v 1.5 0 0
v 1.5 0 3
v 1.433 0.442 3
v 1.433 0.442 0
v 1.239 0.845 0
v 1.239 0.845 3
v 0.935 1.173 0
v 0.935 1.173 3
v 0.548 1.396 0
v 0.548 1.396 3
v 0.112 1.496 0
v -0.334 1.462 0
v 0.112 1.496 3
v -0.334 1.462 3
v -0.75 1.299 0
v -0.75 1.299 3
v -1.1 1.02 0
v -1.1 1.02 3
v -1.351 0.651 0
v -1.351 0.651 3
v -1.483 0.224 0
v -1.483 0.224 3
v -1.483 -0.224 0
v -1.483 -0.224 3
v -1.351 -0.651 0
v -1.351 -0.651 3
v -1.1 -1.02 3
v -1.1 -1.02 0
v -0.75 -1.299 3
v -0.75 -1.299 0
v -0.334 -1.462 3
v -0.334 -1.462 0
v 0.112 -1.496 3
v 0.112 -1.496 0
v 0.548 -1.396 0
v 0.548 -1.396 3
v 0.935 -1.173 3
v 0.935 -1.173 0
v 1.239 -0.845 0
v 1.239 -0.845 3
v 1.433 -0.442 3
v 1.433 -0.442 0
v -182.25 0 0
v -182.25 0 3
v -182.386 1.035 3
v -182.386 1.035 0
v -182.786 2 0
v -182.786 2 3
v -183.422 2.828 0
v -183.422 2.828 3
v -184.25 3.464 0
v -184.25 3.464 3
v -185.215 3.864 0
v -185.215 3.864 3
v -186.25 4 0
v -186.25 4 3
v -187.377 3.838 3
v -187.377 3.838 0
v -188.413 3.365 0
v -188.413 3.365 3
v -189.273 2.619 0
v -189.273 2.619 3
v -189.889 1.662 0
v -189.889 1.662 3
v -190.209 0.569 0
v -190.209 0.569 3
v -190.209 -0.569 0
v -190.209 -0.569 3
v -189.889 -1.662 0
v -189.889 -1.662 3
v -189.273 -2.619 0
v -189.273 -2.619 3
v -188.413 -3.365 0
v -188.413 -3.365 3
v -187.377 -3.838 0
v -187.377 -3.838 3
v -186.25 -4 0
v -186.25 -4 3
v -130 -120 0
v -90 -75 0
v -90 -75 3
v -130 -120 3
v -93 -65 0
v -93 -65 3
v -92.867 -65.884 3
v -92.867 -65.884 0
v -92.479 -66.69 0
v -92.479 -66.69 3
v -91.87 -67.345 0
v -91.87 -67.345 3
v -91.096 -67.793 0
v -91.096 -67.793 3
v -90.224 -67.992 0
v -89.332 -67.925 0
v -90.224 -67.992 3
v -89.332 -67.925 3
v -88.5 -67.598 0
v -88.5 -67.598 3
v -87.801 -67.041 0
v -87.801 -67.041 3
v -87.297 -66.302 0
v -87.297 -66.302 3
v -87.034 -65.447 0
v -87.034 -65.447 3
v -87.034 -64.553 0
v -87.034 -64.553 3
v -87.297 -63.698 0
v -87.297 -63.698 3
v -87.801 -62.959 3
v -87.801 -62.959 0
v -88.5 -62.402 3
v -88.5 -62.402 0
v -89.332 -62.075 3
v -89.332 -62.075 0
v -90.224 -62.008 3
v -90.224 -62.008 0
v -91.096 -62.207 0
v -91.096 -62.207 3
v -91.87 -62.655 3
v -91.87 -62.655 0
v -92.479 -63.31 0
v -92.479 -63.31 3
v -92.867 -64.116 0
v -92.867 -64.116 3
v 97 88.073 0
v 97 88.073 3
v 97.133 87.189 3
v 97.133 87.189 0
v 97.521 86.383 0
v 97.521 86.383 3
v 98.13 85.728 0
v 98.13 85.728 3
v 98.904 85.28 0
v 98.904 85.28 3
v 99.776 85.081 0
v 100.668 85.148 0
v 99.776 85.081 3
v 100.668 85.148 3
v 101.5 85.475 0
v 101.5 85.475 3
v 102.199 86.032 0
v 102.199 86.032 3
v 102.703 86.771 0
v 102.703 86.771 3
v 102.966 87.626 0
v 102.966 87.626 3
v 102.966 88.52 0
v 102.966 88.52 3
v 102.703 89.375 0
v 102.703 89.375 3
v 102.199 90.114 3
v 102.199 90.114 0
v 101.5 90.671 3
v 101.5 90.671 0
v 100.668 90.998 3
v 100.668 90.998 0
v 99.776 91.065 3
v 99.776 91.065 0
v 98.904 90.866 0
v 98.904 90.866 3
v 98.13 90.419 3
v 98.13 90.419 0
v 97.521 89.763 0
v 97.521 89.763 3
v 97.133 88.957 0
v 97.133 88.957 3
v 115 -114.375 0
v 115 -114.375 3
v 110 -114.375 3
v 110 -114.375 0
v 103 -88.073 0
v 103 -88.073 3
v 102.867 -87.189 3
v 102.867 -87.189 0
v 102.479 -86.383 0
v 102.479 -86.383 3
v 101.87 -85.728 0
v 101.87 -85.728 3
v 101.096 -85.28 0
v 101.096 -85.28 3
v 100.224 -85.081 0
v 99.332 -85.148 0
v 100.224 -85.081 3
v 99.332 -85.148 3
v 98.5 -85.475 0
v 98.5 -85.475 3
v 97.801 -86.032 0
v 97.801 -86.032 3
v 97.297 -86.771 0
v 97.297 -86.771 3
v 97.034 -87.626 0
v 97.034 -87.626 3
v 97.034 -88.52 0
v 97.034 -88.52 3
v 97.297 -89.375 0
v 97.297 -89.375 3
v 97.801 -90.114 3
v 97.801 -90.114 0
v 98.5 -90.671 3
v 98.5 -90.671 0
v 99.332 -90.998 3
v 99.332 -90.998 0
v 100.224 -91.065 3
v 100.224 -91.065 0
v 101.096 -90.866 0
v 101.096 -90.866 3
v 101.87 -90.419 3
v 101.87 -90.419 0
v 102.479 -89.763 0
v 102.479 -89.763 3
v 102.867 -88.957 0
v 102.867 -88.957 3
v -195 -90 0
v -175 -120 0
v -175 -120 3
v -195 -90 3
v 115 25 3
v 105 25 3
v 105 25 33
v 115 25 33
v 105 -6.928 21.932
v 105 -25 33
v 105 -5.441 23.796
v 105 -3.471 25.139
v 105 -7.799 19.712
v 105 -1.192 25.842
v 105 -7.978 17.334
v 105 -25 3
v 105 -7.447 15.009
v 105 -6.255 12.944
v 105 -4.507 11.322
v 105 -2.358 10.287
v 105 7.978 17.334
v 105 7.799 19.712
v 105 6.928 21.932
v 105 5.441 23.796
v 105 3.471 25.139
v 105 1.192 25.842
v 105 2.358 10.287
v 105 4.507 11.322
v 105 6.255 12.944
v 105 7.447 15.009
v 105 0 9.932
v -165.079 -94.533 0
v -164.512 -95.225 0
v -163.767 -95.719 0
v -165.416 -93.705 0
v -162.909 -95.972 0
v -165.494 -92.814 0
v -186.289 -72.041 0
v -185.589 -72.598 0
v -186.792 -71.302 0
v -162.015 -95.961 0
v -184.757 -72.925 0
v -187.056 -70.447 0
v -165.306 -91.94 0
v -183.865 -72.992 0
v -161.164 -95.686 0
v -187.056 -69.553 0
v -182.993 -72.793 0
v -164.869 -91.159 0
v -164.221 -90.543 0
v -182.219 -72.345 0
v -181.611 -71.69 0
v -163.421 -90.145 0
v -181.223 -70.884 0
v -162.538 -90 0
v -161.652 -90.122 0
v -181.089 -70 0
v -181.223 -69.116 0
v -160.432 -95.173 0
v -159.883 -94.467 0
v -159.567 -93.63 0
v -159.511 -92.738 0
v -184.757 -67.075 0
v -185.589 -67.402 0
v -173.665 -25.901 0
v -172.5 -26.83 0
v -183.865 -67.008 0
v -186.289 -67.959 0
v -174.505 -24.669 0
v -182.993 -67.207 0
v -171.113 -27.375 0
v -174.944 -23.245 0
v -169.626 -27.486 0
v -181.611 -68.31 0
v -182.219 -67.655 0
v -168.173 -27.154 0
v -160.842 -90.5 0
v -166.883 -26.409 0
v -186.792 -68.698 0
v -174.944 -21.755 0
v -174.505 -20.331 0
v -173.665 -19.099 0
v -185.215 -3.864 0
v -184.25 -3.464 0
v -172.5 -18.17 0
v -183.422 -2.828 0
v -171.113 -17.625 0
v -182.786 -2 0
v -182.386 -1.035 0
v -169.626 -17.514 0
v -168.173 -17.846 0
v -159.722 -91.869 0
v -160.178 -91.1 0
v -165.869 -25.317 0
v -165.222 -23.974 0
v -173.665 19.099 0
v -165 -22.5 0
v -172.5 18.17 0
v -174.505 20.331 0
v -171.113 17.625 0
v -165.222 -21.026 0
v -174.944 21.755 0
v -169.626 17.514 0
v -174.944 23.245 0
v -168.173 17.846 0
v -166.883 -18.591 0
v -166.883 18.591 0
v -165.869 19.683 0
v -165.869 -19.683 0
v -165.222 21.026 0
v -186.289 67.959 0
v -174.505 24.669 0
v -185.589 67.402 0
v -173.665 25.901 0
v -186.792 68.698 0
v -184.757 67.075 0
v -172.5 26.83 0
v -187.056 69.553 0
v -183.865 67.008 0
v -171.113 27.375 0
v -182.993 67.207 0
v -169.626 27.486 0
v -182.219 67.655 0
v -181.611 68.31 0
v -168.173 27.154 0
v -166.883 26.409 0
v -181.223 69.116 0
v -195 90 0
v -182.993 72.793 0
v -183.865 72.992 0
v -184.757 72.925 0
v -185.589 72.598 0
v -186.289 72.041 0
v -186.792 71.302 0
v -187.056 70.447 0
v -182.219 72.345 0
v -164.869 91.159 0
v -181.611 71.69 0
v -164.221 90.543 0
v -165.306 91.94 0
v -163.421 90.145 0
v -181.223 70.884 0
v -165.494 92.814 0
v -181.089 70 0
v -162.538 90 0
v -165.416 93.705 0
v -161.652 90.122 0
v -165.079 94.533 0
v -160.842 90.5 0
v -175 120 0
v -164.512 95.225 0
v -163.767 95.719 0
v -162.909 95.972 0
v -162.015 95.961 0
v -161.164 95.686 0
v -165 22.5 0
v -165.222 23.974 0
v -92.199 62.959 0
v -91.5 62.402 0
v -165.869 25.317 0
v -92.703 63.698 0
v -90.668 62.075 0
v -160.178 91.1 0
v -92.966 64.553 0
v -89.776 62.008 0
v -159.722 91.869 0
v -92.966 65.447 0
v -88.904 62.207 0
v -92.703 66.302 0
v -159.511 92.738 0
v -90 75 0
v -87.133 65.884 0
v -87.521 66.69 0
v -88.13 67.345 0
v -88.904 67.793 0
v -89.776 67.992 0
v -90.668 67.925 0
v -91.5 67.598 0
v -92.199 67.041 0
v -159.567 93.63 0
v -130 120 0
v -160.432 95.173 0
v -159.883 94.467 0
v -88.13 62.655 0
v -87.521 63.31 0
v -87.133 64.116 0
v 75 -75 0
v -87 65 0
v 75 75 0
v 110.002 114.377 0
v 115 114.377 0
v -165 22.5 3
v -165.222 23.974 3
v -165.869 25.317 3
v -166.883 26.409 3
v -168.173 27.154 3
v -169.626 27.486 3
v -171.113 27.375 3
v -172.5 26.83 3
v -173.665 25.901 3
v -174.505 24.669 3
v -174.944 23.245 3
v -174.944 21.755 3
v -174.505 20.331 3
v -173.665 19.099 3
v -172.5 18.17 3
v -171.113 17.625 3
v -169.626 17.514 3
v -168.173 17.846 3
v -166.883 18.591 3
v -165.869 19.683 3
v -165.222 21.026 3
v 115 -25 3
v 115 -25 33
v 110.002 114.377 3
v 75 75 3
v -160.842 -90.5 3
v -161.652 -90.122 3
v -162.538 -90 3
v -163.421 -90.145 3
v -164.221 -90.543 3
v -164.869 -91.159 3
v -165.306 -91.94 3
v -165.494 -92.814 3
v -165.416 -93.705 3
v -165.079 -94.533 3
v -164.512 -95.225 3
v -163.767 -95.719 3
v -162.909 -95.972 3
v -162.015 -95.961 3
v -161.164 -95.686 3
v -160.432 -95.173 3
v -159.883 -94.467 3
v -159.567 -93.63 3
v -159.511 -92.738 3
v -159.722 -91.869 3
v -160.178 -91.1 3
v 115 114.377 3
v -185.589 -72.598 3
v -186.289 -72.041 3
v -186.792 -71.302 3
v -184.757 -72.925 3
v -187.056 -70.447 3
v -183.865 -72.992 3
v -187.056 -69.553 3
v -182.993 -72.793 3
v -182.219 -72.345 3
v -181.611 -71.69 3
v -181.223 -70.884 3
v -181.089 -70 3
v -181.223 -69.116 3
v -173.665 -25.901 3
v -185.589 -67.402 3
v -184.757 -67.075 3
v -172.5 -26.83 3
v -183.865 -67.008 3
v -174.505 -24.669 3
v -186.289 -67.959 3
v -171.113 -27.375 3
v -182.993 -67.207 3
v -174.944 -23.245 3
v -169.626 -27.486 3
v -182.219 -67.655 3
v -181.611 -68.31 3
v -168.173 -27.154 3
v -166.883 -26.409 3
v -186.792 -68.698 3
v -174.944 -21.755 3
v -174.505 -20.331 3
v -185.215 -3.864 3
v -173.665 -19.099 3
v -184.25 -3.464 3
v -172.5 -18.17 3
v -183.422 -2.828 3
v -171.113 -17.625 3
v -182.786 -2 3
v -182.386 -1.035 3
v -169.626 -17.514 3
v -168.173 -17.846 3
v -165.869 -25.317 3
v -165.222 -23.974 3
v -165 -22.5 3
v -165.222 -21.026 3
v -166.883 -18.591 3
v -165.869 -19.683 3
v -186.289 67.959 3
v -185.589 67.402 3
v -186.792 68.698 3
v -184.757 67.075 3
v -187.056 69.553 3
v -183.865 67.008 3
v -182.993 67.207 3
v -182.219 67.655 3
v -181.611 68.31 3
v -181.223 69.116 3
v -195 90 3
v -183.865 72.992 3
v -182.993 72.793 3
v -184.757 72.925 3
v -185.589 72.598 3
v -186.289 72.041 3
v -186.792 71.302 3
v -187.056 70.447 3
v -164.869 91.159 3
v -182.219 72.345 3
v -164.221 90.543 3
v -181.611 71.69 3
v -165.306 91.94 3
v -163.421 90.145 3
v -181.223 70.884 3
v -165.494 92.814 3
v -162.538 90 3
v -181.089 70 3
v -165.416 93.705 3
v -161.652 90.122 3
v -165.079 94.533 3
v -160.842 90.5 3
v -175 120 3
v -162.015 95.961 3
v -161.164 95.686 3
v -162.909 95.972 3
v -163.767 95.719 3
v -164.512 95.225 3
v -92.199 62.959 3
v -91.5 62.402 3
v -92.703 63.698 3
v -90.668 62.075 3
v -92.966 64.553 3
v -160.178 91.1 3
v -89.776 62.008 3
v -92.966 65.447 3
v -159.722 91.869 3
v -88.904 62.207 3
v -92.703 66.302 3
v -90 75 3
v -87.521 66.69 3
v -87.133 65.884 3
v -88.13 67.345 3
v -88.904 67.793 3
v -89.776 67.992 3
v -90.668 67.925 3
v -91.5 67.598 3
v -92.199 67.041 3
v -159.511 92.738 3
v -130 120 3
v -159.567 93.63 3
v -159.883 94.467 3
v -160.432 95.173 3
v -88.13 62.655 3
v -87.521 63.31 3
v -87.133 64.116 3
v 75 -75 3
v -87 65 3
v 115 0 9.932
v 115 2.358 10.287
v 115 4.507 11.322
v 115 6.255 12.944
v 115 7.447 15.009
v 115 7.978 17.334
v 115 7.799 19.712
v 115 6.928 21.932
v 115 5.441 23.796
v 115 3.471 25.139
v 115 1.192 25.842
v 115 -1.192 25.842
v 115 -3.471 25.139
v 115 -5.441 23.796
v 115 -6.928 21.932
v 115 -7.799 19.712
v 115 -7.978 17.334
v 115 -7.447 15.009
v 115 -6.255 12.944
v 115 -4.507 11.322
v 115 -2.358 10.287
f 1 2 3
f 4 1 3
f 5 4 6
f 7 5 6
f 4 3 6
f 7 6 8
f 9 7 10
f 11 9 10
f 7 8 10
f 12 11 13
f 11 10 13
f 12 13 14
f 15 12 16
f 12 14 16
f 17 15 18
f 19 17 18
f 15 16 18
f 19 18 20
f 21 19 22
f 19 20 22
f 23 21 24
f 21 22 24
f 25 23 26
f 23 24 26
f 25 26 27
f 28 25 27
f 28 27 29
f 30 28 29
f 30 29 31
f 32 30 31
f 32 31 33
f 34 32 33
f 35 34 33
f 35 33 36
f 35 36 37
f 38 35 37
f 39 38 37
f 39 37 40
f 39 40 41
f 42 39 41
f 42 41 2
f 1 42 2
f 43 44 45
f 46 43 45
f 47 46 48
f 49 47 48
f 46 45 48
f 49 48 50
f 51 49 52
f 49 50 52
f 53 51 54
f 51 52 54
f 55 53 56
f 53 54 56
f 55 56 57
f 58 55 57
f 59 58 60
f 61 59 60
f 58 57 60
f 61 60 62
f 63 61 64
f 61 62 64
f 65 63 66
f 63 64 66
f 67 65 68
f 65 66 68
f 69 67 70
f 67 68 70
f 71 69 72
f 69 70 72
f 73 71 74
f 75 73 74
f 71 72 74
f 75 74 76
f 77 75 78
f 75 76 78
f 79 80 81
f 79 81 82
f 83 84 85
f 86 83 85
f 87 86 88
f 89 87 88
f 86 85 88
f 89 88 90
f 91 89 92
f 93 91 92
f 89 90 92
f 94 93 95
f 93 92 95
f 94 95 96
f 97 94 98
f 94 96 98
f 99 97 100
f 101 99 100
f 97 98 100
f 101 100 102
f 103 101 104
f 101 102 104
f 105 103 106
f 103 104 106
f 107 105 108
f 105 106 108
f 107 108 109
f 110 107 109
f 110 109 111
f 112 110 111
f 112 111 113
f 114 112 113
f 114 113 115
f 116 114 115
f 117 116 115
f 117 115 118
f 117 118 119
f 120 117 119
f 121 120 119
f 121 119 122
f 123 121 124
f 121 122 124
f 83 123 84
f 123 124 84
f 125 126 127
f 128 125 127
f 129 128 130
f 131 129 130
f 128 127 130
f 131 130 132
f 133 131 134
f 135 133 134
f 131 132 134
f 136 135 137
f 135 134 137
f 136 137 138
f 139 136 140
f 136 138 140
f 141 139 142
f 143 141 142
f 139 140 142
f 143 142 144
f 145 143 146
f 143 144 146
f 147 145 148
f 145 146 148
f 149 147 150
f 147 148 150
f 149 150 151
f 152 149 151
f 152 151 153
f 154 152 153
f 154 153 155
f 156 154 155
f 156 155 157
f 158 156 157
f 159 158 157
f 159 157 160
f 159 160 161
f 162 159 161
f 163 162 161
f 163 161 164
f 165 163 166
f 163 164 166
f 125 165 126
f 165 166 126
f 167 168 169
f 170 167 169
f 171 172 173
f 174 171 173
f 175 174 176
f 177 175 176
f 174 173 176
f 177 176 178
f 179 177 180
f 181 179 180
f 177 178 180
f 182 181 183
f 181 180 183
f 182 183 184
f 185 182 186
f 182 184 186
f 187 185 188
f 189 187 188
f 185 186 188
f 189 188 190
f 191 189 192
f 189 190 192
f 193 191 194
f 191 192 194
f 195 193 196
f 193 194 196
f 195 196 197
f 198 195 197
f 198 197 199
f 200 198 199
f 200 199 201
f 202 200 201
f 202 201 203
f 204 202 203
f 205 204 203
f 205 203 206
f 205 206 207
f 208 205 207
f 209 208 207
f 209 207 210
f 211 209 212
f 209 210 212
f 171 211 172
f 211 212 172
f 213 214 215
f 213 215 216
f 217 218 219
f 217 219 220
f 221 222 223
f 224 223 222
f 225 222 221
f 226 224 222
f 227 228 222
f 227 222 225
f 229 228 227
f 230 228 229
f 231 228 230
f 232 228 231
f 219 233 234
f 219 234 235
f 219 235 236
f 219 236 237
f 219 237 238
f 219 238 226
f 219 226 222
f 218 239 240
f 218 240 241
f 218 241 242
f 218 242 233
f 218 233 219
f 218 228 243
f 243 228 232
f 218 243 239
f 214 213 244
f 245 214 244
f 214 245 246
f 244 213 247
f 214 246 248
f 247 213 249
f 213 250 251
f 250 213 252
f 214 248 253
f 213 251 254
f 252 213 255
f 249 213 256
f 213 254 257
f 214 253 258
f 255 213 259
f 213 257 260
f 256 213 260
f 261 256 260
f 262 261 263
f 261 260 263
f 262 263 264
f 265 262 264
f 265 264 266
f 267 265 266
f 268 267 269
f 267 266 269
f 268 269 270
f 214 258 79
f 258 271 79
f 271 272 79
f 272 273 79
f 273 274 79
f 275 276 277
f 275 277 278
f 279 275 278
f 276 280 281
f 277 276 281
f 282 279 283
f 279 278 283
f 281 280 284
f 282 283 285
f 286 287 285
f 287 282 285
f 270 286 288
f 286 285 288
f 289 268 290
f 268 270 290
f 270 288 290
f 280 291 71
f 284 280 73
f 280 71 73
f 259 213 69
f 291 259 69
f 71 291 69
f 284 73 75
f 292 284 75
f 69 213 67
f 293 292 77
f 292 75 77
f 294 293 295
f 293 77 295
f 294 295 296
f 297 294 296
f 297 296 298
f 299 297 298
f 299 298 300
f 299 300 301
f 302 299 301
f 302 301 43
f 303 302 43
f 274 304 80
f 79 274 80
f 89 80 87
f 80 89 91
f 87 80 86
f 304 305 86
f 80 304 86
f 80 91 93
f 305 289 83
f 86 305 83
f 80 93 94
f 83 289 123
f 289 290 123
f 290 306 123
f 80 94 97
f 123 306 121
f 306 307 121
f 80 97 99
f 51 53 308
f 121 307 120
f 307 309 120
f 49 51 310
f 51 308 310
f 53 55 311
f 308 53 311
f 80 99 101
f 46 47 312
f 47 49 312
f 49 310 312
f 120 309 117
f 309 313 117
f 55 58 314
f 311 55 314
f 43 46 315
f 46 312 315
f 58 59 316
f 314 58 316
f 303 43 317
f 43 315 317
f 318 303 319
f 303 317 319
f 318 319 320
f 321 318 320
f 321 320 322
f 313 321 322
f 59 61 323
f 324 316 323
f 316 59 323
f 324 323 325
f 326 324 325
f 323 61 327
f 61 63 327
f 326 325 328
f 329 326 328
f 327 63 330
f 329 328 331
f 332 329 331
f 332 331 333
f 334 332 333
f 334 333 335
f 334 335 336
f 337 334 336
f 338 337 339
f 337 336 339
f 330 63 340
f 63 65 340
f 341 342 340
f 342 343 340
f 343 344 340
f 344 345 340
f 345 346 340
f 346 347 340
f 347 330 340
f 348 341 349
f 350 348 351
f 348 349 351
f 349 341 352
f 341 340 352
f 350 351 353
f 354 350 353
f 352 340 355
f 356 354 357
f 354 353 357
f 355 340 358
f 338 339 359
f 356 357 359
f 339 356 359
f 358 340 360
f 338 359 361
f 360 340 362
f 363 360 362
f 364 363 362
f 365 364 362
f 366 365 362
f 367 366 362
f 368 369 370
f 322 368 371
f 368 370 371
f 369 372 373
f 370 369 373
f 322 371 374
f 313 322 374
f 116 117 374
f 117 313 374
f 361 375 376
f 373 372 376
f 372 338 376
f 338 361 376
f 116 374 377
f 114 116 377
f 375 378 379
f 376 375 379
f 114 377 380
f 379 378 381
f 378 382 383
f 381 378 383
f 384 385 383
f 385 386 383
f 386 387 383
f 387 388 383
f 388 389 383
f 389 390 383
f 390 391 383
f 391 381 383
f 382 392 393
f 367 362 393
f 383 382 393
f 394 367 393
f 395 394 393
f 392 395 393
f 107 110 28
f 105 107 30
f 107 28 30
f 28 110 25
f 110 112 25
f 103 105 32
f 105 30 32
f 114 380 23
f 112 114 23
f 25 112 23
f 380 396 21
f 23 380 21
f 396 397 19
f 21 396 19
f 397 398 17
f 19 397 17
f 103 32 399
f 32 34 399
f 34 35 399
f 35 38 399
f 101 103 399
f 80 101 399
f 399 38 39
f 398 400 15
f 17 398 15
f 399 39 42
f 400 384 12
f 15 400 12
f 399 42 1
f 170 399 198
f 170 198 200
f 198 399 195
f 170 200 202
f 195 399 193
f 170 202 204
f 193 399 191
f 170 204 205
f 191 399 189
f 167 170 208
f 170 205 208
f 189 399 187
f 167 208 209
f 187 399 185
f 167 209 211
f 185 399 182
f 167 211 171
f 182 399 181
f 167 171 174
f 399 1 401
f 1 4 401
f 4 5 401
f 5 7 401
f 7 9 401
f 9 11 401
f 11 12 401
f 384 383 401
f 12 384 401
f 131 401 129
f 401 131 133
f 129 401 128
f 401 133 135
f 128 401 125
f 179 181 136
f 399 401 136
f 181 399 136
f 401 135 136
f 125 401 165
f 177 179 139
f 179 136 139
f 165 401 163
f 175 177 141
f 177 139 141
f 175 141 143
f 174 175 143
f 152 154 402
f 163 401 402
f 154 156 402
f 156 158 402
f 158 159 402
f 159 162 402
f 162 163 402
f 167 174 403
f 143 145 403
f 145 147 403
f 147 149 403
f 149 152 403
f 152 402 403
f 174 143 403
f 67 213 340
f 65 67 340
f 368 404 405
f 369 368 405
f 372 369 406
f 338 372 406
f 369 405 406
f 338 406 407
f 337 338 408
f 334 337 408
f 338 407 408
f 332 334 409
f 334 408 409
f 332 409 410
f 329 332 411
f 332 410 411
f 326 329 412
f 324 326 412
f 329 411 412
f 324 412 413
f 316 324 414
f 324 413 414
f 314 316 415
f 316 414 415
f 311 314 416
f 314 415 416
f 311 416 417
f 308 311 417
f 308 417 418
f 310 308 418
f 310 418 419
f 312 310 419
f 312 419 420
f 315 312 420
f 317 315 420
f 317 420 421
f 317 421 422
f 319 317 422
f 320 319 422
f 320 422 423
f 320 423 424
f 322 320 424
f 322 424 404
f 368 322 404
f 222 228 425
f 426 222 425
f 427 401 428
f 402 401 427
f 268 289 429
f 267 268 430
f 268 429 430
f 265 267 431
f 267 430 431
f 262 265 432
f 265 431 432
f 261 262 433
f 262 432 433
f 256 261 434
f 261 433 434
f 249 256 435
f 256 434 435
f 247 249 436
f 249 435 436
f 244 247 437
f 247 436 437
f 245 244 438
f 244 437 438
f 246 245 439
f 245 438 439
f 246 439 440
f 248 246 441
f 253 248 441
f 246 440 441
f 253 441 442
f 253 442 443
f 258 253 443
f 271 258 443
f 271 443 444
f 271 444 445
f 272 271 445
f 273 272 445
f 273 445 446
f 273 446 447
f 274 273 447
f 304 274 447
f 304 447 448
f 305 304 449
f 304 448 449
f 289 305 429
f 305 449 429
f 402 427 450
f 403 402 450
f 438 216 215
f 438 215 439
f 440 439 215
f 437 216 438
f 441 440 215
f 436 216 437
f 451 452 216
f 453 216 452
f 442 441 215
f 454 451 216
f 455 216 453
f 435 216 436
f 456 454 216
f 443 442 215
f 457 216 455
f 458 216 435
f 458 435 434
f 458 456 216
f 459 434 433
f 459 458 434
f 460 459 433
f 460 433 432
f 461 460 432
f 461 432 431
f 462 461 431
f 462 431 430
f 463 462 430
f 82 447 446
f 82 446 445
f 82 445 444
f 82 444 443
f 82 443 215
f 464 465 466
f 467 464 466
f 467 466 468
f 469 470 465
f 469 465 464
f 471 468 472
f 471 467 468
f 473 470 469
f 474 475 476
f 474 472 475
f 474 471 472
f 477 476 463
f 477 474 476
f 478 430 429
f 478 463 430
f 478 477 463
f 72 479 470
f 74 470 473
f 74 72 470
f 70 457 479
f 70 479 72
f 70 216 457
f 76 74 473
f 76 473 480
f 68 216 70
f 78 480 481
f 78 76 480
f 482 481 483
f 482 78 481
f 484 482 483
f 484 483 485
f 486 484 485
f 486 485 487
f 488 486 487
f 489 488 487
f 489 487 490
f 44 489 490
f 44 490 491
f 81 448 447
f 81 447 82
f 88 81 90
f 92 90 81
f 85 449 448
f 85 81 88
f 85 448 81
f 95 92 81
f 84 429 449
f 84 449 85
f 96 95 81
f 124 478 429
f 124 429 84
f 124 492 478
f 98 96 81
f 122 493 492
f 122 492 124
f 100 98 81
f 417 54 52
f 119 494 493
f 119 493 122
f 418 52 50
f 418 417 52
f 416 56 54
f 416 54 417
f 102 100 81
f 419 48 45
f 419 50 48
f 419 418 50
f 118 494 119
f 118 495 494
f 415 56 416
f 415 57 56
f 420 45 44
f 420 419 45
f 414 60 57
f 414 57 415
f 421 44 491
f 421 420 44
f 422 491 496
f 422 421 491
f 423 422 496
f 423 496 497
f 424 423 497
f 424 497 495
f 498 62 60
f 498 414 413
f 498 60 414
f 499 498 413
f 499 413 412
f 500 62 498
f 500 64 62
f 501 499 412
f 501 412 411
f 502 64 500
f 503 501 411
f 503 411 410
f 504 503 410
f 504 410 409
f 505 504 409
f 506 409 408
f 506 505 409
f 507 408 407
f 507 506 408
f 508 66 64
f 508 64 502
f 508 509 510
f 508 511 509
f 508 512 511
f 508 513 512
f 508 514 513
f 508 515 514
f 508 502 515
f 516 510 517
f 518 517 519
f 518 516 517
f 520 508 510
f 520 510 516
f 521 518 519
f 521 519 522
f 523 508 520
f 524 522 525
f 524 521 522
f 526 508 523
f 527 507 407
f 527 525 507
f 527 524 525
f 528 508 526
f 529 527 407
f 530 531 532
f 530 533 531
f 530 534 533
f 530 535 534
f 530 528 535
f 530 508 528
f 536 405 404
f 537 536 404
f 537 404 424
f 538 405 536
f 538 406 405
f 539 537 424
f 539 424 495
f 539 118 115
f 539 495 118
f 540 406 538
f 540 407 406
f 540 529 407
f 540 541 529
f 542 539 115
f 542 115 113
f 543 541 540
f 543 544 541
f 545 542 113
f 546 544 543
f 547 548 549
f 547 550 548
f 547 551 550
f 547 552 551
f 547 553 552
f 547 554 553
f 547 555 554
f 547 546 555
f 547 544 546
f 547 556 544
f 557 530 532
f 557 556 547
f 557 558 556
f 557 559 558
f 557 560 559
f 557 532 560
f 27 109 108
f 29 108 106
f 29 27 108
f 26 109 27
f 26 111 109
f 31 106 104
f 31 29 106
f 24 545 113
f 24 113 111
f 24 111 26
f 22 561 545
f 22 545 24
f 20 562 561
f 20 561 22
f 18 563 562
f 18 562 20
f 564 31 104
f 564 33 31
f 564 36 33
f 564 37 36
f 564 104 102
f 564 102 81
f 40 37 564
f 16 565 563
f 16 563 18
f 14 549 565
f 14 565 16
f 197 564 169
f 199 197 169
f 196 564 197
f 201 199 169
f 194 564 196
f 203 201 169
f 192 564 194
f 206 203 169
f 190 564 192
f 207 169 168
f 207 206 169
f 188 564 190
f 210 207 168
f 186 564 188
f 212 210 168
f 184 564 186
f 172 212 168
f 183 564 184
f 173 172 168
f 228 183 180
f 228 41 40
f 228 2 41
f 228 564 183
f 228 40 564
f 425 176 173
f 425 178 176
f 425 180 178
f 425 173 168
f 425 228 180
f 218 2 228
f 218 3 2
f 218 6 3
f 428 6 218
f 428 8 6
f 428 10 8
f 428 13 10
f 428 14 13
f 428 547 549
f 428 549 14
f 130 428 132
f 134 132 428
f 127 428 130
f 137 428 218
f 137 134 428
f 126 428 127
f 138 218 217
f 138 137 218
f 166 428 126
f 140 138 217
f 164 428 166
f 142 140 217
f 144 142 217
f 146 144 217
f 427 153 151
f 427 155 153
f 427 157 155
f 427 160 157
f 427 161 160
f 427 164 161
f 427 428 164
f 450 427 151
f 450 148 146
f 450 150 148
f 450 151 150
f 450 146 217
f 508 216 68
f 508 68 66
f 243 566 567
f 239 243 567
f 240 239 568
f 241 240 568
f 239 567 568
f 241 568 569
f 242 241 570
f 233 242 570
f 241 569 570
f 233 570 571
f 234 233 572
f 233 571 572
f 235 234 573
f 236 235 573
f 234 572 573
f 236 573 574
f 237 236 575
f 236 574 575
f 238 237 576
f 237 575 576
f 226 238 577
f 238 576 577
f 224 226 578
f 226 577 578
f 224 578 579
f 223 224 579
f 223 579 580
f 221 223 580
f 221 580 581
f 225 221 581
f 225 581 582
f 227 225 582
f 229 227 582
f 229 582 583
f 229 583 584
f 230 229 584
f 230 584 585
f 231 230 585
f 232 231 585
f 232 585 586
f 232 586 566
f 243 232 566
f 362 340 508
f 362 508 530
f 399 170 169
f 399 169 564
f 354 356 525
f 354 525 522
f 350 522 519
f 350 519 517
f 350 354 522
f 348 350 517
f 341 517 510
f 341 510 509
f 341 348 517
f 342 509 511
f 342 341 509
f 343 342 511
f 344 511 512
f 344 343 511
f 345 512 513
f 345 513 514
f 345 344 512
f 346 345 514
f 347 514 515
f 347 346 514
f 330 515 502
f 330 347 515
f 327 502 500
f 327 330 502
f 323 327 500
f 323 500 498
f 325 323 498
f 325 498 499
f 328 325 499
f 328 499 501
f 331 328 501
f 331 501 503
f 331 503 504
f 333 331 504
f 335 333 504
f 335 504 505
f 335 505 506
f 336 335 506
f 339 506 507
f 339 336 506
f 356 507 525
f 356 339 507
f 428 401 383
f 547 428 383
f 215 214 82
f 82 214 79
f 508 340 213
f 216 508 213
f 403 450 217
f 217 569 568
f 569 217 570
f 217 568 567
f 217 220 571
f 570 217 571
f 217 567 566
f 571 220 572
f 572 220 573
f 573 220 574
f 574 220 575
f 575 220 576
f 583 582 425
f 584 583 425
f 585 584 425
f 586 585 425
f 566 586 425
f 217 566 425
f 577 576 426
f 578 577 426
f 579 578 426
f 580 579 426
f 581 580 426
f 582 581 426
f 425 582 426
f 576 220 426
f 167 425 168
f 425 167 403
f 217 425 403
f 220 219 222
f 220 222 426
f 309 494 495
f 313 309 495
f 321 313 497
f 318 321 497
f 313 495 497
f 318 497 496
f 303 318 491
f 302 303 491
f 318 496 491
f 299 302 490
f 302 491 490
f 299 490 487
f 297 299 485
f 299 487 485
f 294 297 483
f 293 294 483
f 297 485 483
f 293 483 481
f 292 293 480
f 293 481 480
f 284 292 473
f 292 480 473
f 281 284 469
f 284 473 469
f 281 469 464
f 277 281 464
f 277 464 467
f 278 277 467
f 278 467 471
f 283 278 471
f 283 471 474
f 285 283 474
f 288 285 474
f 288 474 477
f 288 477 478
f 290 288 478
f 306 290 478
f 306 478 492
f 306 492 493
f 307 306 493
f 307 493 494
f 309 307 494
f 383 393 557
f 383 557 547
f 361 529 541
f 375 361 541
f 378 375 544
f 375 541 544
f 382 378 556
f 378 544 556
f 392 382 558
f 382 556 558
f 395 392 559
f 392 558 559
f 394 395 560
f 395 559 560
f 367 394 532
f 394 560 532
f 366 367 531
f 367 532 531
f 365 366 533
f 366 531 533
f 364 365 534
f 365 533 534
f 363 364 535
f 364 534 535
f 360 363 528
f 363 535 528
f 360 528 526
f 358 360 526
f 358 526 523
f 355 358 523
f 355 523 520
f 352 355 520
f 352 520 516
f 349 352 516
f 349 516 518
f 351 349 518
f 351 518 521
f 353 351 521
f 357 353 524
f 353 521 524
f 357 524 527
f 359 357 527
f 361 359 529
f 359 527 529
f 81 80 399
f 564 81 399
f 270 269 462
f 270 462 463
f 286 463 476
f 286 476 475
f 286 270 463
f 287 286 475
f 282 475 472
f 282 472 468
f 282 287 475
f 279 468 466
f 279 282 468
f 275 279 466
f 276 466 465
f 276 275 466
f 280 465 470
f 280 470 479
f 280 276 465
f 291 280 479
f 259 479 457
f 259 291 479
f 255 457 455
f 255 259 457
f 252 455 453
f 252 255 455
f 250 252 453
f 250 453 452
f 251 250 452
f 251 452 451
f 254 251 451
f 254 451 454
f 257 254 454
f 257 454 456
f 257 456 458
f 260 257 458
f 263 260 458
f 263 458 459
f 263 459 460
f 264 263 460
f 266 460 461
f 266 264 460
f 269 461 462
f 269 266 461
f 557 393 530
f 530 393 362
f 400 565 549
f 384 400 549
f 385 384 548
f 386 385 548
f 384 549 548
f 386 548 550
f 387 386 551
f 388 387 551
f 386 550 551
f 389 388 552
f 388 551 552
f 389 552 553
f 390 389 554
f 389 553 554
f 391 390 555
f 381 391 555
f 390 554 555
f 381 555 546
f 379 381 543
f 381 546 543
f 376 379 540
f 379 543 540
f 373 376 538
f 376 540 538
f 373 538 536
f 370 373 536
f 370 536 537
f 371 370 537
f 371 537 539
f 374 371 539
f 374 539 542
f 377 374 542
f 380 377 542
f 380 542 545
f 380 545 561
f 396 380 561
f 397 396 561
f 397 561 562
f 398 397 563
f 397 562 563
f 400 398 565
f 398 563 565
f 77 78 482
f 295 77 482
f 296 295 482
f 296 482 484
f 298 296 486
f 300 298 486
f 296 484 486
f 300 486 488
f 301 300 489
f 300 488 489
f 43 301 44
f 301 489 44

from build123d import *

# Parameters (mm, degrees)
SKETCH_1_R           = 3
SKETCH_1_W           = 90
SKETCH_1_H           = 120
SKETCH_1_R_2         = 10
SKETCH_1_R_3         = 7.5
EXTRUDE_2_DEPTH      = 3
EXTRUDE_START        = -10
SKETCH_2_R           = 7.5
EXTRUDE_3_DEPTH      = 10
CUT_EXTRUDE_1_DEPTH  = 10
EXTRUDE_START_2      = -3
SKETCH_4_R           = 10
EXTRUDE_4_DEPTH      = 3
SKETCH_6_W           = 7
SKETCH_6_H           = 14.142135624
CUT_EXTRUDE_5_DEPTH  = 333.489097566
SKETCH_7_W           = 90
SKETCH_7_H           = 120
EXTRUDE_5_DEPTH      = 3
SKETCH_8_W           = 10
SKETCH_8_H           = 50
EXTRUDE_6_DEPTH      = 30
SKETCH_9_R           = 8
CUT_EXTRUDE_6_DEPTH  = 30
SKETCH_10_R          = 3
EXTRUDE_7_DEPTH      = 3
SKETCH_11_R          = 3
CUT_EXTRUDE_7_DEPTH  = 3
SKETCH_12_R          = 3
EXTRUDE_8_DEPTH      = 3
SKETCH_13_R          = 3
CUT_EXTRUDE_8_DEPTH  = 3
SKETCH_14_R          = 3
CUT_EXTRUDE_9_DEPTH  = 10
SKETCH_15_R          = 3
CUT_EXTRUDE_10_DEPTH = 231.922064775
SKETCH_16_R          = 3
EXTRUDE_10_DEPTH     = 3
SKETCH_17_R          = 3
CUT_EXTRUDE_11_DEPTH = 231.922064775
SKETCH_18_R          = 5
CUT_EXTRUDE_12_DEPTH = 10
SKETCH_20_R          = 1.5
CUT_EXTRUDE_13_DEPTH = 10
CUT_EXTRUDE_14_DEPTH = 10


with BuildPart() as part:
    # 草图1 → 凸台-拉伸2 (new body)
    # profile 1 of 9: a face of its own
    with BuildSketch(Plane.XY):
        Polygon((195, -115), (195, 115), (190, 115), (190, 120), (115, 120), (115, 75), (75, 75), (-90, 75), (-130, 75), (-130, 120), (-175, 120), (-175, 90), (-195, 90), (-195, -90), (-175, -90), (-175, -120), (-130, -120), (-130, -75), (-90, -75), (75, -75), (115, -75), (115, -120), (190, -120), (190, -115), align=None)
        with Locations((-184.089468205, -70)):
            Circle(SKETCH_1_R, mode=Mode.SUBTRACT)
        with Locations((-87, -69)):
            Circle(SKETCH_1_R, mode=Mode.SUBTRACT)
        with Locations((-184.089468205, 70)):
            Circle(SKETCH_1_R, mode=Mode.SUBTRACT)
        with Locations((-87, 69)):
            Circle(SKETCH_1_R, mode=Mode.SUBTRACT)
        Rectangle(SKETCH_1_W, SKETCH_1_H, mode=Mode.SUBTRACT)
        with Locations((75, 0)):
            Circle(SKETCH_1_R_2, mode=Mode.SUBTRACT)
        with Locations((117.5, 0)):
            Circle(SKETCH_1_R_3, mode=Mode.SUBTRACT)
    # profile 2 of 9: a face of its own
    with BuildSketch(Plane.XY):
        Polygon((-130, 120), (-90, 75), (-130, 75), align=None)
    # profile 3 of 9: a face of its own
    with BuildSketch(Plane.XY):
        Polygon((-175, 120), (-175, 90), (-195, 90), align=None)
    # profile 4 of 9: a face of its own
    with BuildSketch(Plane.XY):
        Polygon((-175, -120), (-195, -90), (-175, -90), align=None)
    # profile 5 of 9: a face of its own
    with BuildSketch(Plane.XY):
        Polygon((-130, -120), (-130, -75), (-90, -75), align=None)
    # profile 6 of 9: a face of its own
    with BuildSketch(Plane.XY):
        Polygon((115, -120), (75, -75), (115, -75), align=None)
        with Locations((104.379549532, -93)):
            Circle(SKETCH_1_R, mode=Mode.SUBTRACT)
    # profile 7 of 9: a face of its own
    with BuildSketch(Plane.XY):
        Polygon((115, 120), (115, 75), (75, 75), align=None)
        with Locations((104.379549532, 93)):
            Circle(SKETCH_1_R, mode=Mode.SUBTRACT)
    # profile 8 of 9: a face of its own
    with BuildSketch(Plane.XY):
        Polygon((190, 120), (195, 115), (190, 115), align=None)
    # profile 9 of 9: a face of its own
    with BuildSketch(Plane.XY):
        Polygon((190, -115), (190, -120), (195, -115), align=None)
    extrude(amount=EXTRUDE_2_DEPTH)

    # 草图2 → 凸台-拉伸3 (add)
    with BuildSketch(Plane.XY.offset(3).offset(EXTRUDE_START)):
        with Locations((117.5, 0)):
            Circle(SKETCH_2_R)
    extrude(amount=EXTRUDE_3_DEPTH)

    # 草图3 → 切除-拉伸1 (cut)
    with BuildSketch(Plane.XY.offset(3)):
        Polygon((115, 120), (115, -120), (190, -120), (195, -115), (195, 115), (190, 120), align=None)
        Polygon((115, -120), (115, -114.375), (110, -114.375), align=None)
        Polygon((115, 114.376866735), (115, 120), (110.00165932, 114.376866735), align=None)
    extrude(amount=-CUT_EXTRUDE_1_DEPTH, mode=Mode.SUBTRACT)

    # 草图4 → 凸台-拉伸4 (add)
    with BuildSketch(Plane.XY.offset(3).offset(EXTRUDE_START_2)):
        with Locations((75, 0)):
            Circle(SKETCH_4_R)
    extrude(amount=EXTRUDE_4_DEPTH)

    # 草图6 → 切除-拉伸5 (cut, through all)
    with BuildSketch(Plane(origin=(115, 0, 0), x_dir=(0, 0, -1), z_dir=(1, 0, 0))):
        with Locations((3.5, 0)):
            Rectangle(SKETCH_6_W, SKETCH_6_H)
    extrude(amount=-CUT_EXTRUDE_5_DEPTH, mode=Mode.SUBTRACT)

    # 草图7 → 凸台-拉伸5 (add)
    with BuildSketch(Plane.XY.offset(3)):
        Rectangle(SKETCH_7_W, SKETCH_7_H)
    extrude(amount=-EXTRUDE_5_DEPTH)

    # 草图8 → 凸台-拉伸6 (add)
    with BuildSketch(Plane.XY.offset(3)):
        with Locations((110, 0)):
            Rectangle(SKETCH_8_W, SKETCH_8_H)
    extrude(amount=EXTRUDE_6_DEPTH)

    # 草图9 → 切除-拉伸6 (cut)
    with BuildSketch(Plane(origin=(115, 0, 0), x_dir=(0, 0, -1), z_dir=(1, 0, 0))):
        with Locations((-17.93158575, 0)):
            Circle(SKETCH_9_R)
    extrude(amount=-CUT_EXTRUDE_6_DEPTH, mode=Mode.SUBTRACT)

    # 草图10 → 凸台-拉伸7 (add)
    with BuildSketch(Plane.XY.offset(3).offset(EXTRUDE_START_2)):
        with Locations((104.379549532, -93)):
            Circle(SKETCH_10_R)
        with Locations((104.379549532, 93)):
            Circle(SKETCH_10_R)
    extrude(amount=EXTRUDE_7_DEPTH)

    # 草图11 → 切除-拉伸7 (cut)
    with BuildSketch(Plane.XY.offset(3)):
        with Locations((100, -88.073006777)):
            Circle(SKETCH_11_R)
        with Locations(Location((100, 88.073006777, 0), (0, 0, 180))):
            Circle(SKETCH_11_R)
    extrude(amount=-CUT_EXTRUDE_7_DEPTH, mode=Mode.SUBTRACT)

    # 草图12 → 凸台-拉伸8 (add)
    with BuildSketch(Plane.XY.offset(3).offset(EXTRUDE_START_2)):
        with Locations((-87, 69)):
            Circle(SKETCH_12_R)
        with Locations((-87, -69)):
            Circle(SKETCH_12_R)
    extrude(amount=EXTRUDE_8_DEPTH)

    # 草图13 → 切除-拉伸8 (cut)
    with BuildSketch(Plane.XY.offset(3)):
        with Locations((-90, 65)):
            Circle(SKETCH_13_R)
        with Locations(Location((-90, -65, 0), (0, 0, 180))):
            Circle(SKETCH_13_R)
    extrude(amount=-CUT_EXTRUDE_8_DEPTH, mode=Mode.SUBTRACT)

    # 草图14 → 切除-拉伸9 (cut)
    with BuildSketch(Plane.XY.offset(3)):
        with BuildLine():
            ThreePointArc((-159.5, 88), (-160.378679656, 90.121320344), (-162.5, 91))
            Line((-162.5, 91), (-162.5, 85))
            ThreePointArc((-162.5, 85), (-160.378679656, 85.878679656), (-159.5, 88))
        make_face()
        with BuildLine():
            Line((-162.5, 85), (-162.5, 91))
            ThreePointArc((-162.5, 91), (-165.5, 88), (-162.5, 85))
        make_face()
        with Locations((-162.5, -88)):
            Circle(SKETCH_14_R)
    extrude(amount=-CUT_EXTRUDE_9_DEPTH, mode=Mode.SUBTRACT)

    # 草图15 → 切除-拉伸10 (cut, through all)
    with BuildSketch(Plane.XY.offset(3)):
        with Locations((-162.5, -93)):
            Circle(SKETCH_15_R)
        with Locations((-162.5, -88)):
            Circle(SKETCH_15_R)
        with Locations((-162.5, 93)):
            Circle(SKETCH_15_R)
        with Locations((-162.5, 88)):
            Circle(SKETCH_15_R)
    extrude(amount=-CUT_EXTRUDE_10_DEPTH, mode=Mode.SUBTRACT)

    # 草图16 → 凸台-拉伸10 (add)
    with BuildSketch(Plane.XY.offset(3)):
        with Locations((-162.5, 88)):
            Circle(SKETCH_16_R)
        with Locations((-162.5, -88)):
            Circle(SKETCH_16_R)
    extrude(amount=-EXTRUDE_10_DEPTH)

    # 草图17 → 切除-拉伸11 (cut, through all)
    with BuildSketch(Plane.XY.offset(3)):
        with Locations((-162.5, 93)):
            Circle(SKETCH_17_R)
        with Locations((-162.5, -93)):
            Circle(SKETCH_17_R)
    extrude(amount=-CUT_EXTRUDE_11_DEPTH, mode=Mode.SUBTRACT)

    # 草图18 → 切除-拉伸12 (cut)
    with BuildSketch(Plane.XY.offset(3)):
        with Locations((-170, 22.5)):
            Circle(SKETCH_18_R)
        with Locations((-170, -22.5)):
            Circle(SKETCH_18_R)
    extrude(amount=-CUT_EXTRUDE_12_DEPTH, mode=Mode.SUBTRACT)

    # 草图20 → 切除-拉伸13 (cut)
    with BuildSketch(Plane.XY.offset(3)):
        Circle(SKETCH_20_R)
    extrude(amount=-CUT_EXTRUDE_13_DEPTH, mode=Mode.SUBTRACT)

    # 草图21 → 切除-拉伸14 (cut)
    with BuildSketch(Plane.XY.offset(3)):
        with BuildLine():
            ThreePointArc((-182.25, 0), (-183.421572875, 2.828427125), (-186.25, 4))
            Line((-186.25, 4), (-186.25, -4))
            ThreePointArc((-186.25, -4), (-183.421572875, -2.828427125), (-182.25, 0))
        make_face()
        with BuildLine():
            Line((-186.25, -4), (-186.25, 4))
            ThreePointArc((-186.25, 4), (-190.25, 0), (-186.25, -4))
        make_face()
    extrude(amount=-CUT_EXTRUDE_14_DEPTH, mode=Mode.SUBTRACT)


solid = part.part
